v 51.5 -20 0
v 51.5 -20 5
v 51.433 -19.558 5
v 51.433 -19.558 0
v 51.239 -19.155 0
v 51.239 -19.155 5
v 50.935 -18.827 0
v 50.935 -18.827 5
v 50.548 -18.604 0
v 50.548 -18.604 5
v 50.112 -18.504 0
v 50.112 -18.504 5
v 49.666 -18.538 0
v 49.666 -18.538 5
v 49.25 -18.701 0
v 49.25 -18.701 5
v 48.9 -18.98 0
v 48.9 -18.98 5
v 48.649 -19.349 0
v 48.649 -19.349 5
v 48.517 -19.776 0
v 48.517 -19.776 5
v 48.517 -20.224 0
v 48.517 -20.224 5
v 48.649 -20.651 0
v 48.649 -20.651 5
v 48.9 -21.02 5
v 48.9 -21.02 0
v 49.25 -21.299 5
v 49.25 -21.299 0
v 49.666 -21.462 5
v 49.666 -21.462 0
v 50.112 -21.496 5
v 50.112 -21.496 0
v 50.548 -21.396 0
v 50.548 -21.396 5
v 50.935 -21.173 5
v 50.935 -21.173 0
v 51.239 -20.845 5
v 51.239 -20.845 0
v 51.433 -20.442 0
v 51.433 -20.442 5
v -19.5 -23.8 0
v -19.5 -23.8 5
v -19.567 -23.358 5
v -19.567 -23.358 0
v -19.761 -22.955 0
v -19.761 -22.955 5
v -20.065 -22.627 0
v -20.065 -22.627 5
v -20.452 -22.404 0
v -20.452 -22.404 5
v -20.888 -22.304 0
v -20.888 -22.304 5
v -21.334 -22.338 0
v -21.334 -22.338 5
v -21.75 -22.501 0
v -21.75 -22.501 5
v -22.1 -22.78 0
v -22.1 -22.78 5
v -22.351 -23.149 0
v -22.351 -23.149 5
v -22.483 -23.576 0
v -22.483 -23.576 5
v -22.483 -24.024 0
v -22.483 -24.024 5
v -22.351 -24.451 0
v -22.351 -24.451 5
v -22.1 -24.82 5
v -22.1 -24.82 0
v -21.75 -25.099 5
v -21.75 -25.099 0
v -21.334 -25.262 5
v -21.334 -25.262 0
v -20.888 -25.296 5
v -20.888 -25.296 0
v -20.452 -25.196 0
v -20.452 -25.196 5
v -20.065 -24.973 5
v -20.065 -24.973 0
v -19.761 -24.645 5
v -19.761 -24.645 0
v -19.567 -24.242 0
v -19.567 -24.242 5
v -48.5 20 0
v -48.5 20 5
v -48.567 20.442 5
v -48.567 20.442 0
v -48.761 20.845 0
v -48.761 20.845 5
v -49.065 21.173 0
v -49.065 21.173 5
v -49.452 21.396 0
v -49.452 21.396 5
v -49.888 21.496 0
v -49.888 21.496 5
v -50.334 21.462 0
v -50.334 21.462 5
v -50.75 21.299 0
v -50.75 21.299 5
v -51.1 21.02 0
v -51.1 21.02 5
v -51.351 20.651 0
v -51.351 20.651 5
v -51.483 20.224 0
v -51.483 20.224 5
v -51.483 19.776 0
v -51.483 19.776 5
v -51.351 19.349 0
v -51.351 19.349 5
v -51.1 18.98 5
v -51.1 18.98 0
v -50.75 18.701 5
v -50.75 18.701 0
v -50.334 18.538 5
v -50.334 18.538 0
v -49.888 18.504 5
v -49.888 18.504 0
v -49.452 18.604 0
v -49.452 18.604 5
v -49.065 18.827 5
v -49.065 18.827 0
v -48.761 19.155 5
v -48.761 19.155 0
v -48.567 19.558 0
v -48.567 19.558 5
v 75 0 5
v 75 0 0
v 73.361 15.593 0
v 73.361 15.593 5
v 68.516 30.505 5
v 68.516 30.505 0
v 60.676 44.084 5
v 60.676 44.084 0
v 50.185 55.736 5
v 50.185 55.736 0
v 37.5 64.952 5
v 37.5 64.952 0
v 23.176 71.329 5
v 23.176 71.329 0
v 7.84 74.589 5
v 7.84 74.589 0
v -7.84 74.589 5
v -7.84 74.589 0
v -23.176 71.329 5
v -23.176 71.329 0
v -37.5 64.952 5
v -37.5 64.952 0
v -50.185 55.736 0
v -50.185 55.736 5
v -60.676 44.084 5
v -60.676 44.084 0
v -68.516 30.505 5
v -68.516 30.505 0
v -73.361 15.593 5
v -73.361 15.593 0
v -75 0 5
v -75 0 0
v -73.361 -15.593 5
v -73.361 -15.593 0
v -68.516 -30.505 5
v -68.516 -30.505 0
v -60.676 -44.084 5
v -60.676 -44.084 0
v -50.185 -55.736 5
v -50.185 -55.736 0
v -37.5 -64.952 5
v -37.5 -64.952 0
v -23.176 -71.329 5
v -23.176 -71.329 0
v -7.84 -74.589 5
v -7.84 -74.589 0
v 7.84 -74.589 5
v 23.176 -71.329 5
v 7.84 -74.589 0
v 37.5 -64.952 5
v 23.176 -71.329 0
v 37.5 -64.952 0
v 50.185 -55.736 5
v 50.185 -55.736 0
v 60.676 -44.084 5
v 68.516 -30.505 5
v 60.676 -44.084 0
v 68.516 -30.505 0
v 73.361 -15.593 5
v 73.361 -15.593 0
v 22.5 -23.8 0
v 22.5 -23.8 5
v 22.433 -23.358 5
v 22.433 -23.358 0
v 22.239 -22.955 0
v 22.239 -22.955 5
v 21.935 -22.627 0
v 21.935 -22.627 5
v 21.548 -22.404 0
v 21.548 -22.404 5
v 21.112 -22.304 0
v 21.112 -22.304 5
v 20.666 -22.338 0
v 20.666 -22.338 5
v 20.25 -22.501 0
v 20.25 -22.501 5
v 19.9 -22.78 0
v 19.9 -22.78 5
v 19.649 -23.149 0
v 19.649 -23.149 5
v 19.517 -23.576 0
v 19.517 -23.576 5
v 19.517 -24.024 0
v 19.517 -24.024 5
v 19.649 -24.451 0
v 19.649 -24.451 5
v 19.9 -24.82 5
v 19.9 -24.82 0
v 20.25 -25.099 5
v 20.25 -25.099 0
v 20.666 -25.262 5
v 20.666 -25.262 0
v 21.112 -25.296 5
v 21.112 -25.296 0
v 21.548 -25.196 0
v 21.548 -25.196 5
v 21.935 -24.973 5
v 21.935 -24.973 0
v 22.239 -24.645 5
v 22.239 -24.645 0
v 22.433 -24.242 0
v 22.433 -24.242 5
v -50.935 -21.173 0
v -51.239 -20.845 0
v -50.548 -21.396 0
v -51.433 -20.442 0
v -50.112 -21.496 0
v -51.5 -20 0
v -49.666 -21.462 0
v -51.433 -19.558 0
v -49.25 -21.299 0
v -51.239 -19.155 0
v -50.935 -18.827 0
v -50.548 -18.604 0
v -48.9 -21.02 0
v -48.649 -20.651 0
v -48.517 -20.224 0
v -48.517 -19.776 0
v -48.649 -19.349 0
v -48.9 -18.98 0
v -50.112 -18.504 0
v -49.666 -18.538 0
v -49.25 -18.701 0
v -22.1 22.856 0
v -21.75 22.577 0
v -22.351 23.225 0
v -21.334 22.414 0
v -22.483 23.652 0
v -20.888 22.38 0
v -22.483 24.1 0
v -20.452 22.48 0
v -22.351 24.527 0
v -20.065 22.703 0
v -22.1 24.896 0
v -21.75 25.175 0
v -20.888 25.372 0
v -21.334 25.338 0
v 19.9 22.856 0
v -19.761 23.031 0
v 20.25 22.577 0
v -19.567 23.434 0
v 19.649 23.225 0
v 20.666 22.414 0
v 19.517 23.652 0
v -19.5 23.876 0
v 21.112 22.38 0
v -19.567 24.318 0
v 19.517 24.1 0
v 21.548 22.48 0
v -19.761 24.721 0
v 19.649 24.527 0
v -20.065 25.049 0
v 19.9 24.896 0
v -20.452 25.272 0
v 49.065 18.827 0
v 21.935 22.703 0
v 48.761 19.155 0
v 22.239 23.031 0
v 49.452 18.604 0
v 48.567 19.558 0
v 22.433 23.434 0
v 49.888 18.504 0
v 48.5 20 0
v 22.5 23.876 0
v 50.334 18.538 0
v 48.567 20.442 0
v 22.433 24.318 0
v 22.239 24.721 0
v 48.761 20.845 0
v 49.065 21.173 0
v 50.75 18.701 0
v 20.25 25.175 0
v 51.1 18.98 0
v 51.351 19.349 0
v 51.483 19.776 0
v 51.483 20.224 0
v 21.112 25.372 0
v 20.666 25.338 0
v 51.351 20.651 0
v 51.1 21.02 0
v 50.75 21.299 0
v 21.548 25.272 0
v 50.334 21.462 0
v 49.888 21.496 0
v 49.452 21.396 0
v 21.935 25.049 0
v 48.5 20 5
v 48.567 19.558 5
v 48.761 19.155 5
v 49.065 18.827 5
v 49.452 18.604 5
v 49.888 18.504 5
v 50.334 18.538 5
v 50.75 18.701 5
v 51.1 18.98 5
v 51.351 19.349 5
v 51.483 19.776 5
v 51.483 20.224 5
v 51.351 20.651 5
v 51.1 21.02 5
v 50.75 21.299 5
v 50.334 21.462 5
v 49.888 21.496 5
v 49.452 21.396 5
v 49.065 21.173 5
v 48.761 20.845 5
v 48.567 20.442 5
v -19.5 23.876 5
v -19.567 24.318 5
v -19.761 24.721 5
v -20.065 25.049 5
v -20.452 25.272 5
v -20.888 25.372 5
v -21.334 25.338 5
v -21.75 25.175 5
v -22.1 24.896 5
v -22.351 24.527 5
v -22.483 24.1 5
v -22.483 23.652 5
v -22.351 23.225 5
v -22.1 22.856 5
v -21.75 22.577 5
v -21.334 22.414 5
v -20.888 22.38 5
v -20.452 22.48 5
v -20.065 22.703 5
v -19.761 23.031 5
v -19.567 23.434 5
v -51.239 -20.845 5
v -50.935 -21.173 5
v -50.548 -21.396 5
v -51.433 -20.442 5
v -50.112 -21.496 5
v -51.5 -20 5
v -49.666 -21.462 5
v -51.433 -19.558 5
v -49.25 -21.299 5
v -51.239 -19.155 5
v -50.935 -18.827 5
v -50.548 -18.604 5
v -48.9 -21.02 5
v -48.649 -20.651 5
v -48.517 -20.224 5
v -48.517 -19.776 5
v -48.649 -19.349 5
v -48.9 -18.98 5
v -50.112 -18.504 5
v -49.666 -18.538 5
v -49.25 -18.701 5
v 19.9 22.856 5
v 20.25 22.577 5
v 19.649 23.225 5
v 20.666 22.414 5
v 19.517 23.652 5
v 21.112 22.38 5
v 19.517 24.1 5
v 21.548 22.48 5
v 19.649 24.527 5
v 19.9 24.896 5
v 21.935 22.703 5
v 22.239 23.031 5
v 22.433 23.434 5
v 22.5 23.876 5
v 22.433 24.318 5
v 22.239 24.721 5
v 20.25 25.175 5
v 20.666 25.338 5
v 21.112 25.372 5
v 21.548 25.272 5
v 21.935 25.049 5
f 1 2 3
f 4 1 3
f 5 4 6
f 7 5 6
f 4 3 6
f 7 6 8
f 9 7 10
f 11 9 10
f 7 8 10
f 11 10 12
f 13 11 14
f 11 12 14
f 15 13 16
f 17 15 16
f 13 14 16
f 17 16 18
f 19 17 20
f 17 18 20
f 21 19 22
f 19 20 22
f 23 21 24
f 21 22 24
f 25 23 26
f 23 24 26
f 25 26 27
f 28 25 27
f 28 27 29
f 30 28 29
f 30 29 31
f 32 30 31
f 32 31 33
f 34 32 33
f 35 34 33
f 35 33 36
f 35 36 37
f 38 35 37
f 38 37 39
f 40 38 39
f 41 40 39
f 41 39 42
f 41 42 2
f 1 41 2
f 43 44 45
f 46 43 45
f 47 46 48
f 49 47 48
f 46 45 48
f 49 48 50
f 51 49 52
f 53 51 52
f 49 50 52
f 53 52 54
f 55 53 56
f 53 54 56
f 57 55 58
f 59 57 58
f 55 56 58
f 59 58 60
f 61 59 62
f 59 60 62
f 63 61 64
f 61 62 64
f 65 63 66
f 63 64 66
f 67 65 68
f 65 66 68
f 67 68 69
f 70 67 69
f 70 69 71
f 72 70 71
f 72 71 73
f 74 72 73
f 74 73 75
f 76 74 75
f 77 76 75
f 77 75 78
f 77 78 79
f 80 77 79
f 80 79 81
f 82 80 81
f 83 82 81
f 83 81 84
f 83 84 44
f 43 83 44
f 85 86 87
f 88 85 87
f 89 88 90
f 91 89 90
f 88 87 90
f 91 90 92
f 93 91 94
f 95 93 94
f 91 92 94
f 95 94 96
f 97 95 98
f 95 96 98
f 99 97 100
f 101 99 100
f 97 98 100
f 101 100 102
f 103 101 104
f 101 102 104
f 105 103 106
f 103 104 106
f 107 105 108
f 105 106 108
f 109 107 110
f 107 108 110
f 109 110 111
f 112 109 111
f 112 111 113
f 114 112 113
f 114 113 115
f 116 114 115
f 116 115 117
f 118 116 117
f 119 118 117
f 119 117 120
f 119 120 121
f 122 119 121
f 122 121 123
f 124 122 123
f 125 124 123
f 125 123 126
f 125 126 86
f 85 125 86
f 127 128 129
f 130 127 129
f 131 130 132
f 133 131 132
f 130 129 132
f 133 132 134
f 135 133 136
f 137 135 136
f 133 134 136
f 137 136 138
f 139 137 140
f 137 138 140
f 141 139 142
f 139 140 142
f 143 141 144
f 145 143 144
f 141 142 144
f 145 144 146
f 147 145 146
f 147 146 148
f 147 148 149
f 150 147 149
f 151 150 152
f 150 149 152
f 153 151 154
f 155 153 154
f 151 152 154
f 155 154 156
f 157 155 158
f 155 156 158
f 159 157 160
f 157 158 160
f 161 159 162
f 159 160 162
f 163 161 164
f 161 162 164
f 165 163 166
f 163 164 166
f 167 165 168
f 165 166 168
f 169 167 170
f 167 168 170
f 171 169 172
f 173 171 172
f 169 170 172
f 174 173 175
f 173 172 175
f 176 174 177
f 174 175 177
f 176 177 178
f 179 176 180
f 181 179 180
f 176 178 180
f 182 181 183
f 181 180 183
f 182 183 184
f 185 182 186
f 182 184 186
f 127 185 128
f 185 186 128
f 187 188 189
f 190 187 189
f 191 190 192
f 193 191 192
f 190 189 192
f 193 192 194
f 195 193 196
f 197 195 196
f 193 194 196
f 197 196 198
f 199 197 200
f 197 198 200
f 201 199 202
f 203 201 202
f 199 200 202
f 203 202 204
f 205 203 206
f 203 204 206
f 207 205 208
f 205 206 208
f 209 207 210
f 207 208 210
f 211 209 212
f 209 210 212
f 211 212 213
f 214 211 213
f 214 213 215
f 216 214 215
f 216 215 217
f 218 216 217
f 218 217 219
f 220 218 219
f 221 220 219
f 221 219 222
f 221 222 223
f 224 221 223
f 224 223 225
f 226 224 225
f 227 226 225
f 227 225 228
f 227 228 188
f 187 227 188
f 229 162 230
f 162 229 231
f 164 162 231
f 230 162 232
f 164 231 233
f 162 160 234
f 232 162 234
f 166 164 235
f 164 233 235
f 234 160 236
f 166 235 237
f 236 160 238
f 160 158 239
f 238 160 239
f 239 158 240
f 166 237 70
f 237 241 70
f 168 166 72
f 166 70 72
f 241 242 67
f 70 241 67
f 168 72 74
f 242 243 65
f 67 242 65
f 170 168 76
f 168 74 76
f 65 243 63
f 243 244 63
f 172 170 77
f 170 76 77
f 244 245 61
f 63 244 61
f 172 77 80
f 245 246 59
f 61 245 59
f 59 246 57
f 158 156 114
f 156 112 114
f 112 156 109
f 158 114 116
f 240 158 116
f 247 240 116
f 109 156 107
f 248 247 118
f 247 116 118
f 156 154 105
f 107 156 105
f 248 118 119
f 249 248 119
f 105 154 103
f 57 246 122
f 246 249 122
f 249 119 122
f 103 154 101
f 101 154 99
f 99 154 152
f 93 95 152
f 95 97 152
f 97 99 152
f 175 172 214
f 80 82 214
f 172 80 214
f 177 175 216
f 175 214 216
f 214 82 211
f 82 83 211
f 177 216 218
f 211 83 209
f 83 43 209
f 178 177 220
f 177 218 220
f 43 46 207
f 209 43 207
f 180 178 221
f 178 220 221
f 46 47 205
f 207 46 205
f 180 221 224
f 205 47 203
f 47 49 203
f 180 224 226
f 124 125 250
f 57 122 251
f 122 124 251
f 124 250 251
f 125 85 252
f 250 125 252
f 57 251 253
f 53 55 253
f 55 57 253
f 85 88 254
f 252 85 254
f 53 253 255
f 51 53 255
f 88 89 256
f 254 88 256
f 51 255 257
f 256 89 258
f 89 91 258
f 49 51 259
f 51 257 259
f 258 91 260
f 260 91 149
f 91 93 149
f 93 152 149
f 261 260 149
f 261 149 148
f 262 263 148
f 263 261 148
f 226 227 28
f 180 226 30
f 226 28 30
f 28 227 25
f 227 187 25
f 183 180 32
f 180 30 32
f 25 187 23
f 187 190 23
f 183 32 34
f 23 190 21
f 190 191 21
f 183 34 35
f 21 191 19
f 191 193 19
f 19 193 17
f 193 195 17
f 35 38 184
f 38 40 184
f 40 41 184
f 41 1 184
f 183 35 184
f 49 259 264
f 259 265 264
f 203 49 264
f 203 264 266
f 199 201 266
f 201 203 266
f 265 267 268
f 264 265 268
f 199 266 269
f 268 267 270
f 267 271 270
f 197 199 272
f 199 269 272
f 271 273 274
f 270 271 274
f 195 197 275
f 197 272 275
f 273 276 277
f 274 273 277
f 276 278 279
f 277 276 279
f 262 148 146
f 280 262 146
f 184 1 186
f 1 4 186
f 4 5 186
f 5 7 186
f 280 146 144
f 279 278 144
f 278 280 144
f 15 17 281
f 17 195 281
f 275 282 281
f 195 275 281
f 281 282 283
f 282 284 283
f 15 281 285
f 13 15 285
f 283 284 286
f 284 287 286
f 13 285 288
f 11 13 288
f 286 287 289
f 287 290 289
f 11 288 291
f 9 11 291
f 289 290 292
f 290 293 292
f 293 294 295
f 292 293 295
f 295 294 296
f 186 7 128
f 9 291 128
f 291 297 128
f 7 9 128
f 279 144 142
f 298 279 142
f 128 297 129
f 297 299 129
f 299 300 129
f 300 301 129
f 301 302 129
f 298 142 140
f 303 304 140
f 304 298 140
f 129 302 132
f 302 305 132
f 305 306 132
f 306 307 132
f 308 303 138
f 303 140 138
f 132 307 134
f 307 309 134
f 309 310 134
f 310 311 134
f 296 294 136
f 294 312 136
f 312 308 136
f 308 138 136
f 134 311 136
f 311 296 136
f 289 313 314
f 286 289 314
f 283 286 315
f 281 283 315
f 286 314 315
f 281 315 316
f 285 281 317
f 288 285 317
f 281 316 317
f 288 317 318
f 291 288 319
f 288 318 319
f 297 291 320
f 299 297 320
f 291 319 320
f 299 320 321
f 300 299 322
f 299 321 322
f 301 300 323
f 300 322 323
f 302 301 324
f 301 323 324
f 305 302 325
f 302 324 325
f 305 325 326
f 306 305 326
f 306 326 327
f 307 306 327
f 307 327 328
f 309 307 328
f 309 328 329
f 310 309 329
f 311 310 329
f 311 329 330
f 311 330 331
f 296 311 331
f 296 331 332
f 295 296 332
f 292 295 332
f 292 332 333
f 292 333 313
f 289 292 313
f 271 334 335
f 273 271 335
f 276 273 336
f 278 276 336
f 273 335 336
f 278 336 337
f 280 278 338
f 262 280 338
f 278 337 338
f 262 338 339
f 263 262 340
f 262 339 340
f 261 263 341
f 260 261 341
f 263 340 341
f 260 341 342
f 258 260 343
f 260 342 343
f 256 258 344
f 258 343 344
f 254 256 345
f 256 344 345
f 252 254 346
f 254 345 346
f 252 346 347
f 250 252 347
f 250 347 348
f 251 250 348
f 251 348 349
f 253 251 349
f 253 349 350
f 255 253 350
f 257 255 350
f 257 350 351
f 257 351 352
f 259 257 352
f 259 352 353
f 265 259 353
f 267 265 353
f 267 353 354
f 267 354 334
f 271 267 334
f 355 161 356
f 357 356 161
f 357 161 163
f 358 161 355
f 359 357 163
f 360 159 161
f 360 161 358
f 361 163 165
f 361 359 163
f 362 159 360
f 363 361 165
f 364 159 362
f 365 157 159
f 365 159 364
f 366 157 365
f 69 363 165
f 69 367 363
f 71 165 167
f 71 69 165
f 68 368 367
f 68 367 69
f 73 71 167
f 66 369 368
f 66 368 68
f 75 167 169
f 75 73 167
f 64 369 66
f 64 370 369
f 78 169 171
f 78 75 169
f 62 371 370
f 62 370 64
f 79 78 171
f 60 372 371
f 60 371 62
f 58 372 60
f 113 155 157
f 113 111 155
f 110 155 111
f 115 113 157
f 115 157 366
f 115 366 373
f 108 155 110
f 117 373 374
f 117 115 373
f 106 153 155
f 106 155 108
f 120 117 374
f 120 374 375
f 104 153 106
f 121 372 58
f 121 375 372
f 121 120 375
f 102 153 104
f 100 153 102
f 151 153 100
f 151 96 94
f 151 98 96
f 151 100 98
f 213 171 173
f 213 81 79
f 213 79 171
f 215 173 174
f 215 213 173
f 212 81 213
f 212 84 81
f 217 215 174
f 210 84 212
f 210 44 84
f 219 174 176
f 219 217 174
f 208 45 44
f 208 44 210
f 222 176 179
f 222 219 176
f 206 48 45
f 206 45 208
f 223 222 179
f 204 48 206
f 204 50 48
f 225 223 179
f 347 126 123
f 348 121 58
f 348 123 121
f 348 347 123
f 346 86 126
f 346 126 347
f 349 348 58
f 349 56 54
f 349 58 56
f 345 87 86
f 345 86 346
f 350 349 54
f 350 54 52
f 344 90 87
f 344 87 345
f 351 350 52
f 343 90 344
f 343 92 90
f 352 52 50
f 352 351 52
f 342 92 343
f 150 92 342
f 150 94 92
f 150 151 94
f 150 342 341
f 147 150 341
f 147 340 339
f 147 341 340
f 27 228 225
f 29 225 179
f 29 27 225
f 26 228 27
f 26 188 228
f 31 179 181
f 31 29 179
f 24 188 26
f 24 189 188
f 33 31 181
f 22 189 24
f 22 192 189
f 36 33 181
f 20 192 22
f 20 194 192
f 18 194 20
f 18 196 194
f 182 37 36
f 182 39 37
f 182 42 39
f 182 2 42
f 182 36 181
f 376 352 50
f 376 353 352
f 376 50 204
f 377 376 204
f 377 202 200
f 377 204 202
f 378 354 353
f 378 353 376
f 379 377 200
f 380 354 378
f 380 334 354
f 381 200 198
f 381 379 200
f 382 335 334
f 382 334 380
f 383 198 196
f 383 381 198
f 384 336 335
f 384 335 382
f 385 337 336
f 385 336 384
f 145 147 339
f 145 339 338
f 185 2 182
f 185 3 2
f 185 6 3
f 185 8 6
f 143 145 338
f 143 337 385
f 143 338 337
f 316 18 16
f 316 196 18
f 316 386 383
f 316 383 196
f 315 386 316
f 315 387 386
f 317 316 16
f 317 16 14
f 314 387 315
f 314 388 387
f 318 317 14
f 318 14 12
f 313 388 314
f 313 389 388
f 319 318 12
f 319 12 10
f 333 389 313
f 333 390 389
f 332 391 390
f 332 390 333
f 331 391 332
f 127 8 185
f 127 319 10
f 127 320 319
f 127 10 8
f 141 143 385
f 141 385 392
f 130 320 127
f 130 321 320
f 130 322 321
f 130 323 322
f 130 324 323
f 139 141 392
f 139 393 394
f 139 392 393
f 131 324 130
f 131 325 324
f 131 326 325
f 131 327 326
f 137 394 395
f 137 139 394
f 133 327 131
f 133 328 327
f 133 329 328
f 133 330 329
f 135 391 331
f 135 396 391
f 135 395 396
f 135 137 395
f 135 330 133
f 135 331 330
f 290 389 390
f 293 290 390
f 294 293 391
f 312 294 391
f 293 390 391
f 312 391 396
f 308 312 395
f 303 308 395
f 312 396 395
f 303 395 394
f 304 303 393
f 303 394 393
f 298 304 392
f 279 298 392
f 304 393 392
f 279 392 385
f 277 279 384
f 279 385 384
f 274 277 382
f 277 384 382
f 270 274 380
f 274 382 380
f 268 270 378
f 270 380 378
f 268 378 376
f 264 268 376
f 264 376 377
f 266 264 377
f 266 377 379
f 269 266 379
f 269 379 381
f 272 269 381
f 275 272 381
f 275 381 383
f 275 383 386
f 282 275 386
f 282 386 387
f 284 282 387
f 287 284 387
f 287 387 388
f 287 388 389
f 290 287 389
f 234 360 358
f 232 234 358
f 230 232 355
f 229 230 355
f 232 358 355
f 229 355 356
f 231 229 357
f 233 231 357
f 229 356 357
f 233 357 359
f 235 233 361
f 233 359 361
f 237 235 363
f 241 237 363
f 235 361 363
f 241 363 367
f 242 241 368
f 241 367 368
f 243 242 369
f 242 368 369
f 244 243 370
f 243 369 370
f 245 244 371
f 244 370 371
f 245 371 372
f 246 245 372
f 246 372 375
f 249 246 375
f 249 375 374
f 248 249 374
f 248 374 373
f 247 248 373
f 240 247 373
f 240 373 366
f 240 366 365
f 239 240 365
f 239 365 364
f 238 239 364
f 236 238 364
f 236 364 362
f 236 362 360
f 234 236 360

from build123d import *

# Parameters (mm, degrees)
CROQUIS1_R              = 75
SALIENTE_EXTRUIR1_DEPTH = 5
CROQUIS2_R              = 1.5
CORTAR_EXTRUIR1_DEPTH   = 107.183802908


with BuildPart() as part:
    # Croquis1 → Saliente-Extruir1 (new body)
    with BuildSketch(Plane.XY):
        Circle(CROQUIS1_R)
    extrude(amount=SALIENTE_EXTRUIR1_DEPTH)

    # Croquis2 → Cortar-Extruir1 (cut, through all)
    with BuildSketch(Plane.XY.offset(5)):
        with Locations((-50, 20)):
            Circle(CROQUIS2_R)
        with Locations(Location((-50, -20, 0), (0, 0, 180))):
            Circle(CROQUIS2_R)
        with Locations((50, -20)):
            Circle(CROQUIS2_R)
        with Locations(Location((50, 20, 0), (0, 0, 180))):
            Circle(CROQUIS2_R)
        with Locations((21, 23.876)):
            Circle(CROQUIS2_R)
        with Locations((-21, 23.876)):
            Circle(CROQUIS2_R)
        with Locations((-21, -23.8)):
            Circle(CROQUIS2_R)
        with Locations((21, -23.8)):
            Circle(CROQUIS2_R)
    extrude(amount=-CORTAR_EXTRUIR1_DEPTH, mode=Mode.SUBTRACT)


solid = part.part
